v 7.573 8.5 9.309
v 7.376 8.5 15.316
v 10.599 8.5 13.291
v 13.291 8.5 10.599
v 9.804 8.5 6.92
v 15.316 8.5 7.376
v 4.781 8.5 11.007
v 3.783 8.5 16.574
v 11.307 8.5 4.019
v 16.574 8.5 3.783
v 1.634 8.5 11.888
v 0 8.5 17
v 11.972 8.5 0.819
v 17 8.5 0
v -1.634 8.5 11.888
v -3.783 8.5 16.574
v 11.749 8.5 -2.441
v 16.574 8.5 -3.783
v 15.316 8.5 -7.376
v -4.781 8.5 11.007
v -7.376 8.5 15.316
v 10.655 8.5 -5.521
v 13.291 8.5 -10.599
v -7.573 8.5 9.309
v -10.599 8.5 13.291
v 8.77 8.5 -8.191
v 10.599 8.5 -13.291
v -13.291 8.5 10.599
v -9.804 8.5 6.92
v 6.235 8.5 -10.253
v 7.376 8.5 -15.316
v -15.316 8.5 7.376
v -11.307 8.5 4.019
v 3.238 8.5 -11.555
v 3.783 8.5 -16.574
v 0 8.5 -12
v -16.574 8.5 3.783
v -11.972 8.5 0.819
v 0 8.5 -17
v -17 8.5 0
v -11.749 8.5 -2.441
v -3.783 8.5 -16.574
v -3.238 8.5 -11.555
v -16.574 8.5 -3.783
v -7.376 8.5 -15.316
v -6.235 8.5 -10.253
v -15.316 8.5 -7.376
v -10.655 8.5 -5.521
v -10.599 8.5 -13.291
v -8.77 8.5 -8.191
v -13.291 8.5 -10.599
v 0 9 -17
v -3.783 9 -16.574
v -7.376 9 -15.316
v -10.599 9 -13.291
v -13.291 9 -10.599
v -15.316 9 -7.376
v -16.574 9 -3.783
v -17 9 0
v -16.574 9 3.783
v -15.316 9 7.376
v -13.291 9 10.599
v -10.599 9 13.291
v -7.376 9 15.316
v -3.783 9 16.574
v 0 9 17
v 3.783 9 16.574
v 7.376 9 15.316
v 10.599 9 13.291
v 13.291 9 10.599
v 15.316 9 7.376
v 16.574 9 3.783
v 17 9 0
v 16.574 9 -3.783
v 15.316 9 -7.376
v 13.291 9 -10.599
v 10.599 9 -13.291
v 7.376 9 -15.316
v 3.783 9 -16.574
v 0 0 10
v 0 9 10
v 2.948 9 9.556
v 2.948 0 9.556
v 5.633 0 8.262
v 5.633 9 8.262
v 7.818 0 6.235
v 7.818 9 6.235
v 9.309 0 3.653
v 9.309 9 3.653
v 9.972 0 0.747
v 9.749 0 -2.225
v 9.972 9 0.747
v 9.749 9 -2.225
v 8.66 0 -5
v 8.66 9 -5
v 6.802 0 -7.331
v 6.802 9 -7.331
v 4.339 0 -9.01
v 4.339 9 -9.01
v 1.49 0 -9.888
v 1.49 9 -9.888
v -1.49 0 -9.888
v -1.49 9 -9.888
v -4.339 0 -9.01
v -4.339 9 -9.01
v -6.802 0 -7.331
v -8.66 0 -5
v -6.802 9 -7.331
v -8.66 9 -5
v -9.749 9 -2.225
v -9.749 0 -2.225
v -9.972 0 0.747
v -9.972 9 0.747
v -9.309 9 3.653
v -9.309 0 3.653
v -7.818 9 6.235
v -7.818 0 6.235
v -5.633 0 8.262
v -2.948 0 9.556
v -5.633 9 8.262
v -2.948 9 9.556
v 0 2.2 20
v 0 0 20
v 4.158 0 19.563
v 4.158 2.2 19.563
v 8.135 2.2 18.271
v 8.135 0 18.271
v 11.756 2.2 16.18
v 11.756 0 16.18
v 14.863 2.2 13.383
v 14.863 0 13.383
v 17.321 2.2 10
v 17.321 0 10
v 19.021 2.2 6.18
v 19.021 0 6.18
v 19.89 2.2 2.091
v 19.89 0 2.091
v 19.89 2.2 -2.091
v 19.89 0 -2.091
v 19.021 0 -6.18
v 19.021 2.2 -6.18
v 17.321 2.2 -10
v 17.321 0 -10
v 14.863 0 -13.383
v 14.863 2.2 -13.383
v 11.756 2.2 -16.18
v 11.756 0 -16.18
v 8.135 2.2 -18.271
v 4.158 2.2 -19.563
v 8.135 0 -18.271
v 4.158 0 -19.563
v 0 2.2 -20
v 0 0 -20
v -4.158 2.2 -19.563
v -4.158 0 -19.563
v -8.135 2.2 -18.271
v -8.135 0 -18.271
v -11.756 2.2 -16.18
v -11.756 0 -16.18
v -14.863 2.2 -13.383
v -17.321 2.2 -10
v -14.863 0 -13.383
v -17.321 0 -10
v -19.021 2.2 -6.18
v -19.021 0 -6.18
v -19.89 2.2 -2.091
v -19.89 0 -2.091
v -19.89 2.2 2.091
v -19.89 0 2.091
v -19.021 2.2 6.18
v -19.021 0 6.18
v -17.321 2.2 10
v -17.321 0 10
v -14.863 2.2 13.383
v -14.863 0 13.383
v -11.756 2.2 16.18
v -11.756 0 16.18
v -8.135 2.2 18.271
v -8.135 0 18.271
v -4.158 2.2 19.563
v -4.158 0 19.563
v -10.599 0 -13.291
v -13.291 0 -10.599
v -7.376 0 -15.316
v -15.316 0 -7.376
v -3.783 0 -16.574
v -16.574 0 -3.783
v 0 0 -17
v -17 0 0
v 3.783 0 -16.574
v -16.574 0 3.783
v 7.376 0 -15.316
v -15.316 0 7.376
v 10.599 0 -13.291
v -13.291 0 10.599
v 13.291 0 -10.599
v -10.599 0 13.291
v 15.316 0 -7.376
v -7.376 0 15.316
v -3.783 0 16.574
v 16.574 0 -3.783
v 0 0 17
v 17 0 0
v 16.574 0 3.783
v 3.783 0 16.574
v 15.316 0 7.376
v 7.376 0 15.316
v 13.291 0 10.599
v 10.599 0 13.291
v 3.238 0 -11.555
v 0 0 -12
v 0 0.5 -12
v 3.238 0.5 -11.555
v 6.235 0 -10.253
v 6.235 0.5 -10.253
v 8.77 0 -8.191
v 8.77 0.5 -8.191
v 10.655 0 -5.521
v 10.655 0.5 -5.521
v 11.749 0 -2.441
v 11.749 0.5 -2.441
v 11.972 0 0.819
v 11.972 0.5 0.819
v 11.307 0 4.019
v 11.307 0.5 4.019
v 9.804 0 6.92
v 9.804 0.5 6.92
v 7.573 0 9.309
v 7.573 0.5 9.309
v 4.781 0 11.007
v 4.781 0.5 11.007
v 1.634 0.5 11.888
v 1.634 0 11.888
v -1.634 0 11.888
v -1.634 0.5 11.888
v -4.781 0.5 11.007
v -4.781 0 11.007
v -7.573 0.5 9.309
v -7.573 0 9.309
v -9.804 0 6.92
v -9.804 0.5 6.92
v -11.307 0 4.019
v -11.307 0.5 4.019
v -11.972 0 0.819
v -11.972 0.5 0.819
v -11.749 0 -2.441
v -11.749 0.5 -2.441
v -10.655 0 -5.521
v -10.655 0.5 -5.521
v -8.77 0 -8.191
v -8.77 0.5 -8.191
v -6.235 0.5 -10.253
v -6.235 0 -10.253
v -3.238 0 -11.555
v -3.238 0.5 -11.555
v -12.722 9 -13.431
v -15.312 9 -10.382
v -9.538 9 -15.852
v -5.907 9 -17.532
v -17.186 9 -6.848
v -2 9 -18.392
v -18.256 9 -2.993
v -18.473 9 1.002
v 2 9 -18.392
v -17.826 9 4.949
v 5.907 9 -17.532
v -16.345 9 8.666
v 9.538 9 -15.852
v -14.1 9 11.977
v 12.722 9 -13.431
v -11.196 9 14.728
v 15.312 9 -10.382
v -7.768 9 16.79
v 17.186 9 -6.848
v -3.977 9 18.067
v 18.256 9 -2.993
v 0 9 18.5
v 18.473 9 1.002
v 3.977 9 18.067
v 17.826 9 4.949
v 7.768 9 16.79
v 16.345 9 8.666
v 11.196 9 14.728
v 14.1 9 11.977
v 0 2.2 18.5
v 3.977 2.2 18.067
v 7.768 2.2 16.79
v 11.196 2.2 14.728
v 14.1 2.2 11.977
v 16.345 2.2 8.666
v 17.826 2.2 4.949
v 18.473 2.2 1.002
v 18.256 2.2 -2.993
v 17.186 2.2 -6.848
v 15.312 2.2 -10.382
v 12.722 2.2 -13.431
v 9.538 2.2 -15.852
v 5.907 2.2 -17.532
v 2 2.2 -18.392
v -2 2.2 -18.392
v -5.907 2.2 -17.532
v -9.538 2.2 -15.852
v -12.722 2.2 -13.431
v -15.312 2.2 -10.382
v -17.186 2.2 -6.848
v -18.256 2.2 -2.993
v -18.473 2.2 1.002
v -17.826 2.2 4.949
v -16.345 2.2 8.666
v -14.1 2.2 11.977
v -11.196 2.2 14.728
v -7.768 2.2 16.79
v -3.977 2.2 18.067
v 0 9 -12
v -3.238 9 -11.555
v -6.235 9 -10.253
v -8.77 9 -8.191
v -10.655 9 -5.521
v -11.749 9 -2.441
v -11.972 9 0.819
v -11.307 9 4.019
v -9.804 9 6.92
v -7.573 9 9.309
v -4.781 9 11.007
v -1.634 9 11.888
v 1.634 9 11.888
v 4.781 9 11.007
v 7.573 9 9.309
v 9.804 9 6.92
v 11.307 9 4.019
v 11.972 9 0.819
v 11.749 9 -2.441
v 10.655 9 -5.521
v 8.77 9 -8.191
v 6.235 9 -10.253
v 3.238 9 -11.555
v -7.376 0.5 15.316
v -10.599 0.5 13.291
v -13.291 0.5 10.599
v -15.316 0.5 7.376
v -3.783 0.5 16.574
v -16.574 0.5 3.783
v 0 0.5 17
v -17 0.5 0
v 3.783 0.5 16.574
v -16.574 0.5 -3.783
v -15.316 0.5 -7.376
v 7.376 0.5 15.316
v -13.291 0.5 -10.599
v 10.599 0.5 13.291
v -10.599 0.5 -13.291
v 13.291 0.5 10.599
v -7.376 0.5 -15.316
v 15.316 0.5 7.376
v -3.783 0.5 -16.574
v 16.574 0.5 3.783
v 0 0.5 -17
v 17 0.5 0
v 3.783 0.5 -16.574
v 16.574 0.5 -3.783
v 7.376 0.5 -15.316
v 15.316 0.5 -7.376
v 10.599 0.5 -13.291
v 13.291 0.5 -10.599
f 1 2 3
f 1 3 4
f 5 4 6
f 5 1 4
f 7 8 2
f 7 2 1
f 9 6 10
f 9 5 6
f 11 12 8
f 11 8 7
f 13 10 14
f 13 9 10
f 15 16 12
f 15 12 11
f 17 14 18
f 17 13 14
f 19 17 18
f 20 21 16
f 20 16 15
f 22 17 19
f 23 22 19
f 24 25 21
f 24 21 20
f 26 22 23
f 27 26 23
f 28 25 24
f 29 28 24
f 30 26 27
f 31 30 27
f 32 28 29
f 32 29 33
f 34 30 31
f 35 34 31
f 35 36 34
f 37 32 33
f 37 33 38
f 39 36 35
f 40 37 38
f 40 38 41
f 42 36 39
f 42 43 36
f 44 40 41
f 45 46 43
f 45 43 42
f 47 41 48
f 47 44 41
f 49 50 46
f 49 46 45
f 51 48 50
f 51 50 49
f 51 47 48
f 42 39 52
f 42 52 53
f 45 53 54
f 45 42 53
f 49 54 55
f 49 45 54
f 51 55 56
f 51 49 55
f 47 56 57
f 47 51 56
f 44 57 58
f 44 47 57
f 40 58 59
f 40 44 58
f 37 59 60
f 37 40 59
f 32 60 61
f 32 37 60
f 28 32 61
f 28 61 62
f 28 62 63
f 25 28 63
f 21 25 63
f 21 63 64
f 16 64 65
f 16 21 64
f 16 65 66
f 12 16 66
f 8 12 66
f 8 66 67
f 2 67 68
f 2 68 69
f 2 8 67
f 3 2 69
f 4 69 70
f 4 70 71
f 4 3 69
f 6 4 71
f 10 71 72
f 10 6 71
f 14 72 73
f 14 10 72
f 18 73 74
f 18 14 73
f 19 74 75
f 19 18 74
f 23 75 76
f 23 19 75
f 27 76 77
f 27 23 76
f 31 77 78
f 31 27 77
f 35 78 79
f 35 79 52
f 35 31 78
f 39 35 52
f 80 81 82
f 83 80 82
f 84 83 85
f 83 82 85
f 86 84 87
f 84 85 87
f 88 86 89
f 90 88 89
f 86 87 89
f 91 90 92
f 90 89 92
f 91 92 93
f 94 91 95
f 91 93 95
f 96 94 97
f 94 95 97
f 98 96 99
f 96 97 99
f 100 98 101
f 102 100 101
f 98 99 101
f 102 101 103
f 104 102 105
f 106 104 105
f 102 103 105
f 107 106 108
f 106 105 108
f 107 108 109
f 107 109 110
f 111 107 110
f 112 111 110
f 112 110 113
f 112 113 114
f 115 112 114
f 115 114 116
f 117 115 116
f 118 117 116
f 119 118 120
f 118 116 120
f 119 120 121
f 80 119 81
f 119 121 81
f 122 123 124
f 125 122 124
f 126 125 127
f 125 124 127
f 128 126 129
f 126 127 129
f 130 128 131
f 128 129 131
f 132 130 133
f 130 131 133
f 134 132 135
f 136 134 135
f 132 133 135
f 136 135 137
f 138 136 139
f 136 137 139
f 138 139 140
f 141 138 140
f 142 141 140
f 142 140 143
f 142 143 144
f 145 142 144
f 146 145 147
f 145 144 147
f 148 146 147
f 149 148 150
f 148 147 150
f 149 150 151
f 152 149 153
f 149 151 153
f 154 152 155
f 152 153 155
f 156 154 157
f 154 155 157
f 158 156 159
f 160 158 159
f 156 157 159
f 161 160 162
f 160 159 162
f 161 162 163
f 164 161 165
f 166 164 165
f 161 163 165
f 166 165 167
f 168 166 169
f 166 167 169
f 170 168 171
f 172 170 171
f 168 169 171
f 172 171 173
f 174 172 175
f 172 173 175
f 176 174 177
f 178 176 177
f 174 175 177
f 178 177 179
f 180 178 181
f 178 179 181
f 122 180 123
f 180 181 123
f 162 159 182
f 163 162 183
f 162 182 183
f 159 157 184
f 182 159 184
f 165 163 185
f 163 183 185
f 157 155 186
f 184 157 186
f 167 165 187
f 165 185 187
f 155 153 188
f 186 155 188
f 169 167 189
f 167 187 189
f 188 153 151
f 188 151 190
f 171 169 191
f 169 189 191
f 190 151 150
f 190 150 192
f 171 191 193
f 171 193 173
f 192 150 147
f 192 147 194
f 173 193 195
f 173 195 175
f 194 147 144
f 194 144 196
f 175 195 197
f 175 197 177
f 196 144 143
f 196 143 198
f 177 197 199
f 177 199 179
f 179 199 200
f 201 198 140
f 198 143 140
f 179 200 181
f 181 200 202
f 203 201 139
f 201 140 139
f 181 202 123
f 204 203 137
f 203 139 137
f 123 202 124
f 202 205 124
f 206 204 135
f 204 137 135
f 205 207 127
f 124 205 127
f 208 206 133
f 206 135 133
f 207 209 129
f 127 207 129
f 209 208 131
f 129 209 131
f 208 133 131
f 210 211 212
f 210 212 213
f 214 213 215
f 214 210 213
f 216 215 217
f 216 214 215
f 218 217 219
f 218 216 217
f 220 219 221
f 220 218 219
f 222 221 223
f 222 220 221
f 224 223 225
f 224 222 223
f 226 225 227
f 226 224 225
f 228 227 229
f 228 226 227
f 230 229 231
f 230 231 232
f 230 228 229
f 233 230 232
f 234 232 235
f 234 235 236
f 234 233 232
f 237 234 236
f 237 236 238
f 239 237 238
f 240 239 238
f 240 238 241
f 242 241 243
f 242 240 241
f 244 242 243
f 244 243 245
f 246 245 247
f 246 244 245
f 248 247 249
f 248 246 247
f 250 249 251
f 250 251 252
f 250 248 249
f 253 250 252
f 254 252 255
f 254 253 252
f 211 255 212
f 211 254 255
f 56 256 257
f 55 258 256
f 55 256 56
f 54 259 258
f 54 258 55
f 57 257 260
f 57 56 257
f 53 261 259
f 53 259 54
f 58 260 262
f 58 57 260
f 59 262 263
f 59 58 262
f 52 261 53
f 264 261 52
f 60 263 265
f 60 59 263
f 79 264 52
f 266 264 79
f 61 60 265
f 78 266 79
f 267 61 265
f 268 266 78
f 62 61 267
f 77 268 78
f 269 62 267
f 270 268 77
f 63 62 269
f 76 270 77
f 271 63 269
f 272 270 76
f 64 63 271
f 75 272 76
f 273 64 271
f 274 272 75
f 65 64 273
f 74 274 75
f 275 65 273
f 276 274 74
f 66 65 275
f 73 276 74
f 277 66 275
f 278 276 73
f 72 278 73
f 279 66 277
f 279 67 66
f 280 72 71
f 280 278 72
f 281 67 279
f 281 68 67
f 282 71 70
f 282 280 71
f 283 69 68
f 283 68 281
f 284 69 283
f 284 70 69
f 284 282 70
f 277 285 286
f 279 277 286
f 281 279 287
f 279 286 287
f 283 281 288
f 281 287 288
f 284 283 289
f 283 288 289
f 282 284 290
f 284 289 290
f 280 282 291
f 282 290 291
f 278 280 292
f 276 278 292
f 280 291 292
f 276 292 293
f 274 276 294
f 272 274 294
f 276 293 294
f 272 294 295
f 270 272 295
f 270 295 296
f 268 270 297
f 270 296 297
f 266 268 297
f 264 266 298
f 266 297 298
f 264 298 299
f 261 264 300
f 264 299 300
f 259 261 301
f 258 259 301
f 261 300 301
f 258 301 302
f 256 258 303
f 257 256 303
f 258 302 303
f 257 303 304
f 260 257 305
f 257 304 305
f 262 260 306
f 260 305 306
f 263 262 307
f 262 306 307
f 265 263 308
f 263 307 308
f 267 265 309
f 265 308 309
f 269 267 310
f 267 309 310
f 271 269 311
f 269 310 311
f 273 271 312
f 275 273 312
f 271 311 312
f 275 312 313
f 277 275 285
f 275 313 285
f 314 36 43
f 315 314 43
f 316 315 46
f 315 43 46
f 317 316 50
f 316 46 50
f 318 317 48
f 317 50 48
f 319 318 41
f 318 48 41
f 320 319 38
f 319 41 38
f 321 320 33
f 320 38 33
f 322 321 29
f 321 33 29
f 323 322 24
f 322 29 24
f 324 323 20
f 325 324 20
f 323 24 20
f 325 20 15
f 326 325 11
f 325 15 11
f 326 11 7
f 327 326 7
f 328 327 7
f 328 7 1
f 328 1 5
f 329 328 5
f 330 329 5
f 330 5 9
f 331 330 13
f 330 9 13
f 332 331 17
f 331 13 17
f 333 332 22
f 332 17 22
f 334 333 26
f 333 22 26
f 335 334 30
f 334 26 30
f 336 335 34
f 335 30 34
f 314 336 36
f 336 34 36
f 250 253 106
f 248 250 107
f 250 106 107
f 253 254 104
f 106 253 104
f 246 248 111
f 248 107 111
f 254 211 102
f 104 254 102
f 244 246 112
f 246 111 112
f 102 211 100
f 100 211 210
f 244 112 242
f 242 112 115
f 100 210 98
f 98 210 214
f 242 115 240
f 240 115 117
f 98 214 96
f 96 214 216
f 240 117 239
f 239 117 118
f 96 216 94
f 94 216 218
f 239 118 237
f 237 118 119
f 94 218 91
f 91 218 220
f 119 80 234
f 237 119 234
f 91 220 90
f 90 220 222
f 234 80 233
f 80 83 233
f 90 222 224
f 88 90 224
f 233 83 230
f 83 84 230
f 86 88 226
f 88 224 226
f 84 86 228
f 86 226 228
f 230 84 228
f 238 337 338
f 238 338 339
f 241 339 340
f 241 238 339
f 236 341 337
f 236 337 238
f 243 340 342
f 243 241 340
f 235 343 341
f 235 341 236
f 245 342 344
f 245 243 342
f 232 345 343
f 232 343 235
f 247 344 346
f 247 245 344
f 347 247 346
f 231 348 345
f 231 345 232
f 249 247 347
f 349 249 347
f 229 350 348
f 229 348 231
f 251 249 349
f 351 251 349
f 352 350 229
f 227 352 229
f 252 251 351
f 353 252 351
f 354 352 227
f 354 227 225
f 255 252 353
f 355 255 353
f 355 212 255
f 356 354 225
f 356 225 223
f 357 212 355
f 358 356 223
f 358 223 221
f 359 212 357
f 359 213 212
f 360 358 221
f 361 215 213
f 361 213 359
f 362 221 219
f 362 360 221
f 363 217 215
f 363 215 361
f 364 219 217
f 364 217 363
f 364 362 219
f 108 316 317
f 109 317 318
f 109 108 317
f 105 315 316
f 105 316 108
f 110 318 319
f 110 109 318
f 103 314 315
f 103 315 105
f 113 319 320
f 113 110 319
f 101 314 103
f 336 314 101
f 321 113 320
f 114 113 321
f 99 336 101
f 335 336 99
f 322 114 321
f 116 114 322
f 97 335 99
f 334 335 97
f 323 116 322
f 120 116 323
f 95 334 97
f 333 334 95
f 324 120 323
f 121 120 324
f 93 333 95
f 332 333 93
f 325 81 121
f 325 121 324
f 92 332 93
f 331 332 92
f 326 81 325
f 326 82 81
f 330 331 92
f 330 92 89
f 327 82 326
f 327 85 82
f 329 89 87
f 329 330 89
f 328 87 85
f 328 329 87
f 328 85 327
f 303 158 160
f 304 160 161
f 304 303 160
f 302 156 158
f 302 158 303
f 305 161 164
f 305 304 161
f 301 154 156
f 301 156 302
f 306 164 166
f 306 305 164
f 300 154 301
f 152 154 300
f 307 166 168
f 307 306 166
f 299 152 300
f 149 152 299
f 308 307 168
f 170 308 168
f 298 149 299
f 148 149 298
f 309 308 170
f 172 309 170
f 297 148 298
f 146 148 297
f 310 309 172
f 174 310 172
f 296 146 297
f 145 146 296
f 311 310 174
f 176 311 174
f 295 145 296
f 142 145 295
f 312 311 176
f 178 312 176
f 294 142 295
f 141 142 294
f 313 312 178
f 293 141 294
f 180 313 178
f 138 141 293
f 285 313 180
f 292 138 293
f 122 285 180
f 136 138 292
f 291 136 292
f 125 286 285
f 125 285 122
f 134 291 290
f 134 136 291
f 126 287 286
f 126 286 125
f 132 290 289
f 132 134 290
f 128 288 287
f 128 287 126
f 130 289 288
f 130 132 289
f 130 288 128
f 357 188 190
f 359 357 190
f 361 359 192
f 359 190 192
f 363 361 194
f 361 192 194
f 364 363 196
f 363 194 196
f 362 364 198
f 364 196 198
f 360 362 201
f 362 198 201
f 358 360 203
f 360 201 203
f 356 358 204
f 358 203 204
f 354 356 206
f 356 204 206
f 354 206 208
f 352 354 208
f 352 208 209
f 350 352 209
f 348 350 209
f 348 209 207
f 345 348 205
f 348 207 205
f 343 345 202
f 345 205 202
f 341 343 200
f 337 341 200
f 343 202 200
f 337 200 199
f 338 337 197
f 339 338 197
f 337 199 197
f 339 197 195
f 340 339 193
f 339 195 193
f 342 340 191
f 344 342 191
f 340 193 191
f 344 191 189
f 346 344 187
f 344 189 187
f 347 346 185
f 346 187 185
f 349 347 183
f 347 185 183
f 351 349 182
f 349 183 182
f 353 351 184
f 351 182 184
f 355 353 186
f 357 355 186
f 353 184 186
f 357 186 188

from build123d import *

# Parameters (mm, degrees)
SKETCH_1_R          = 20
EXTRUDE_1_DEPTH     = 2.2
SKETCH_2_R          = 18.5
EXTRUDE_2_DEPTH     = 6.8
SKETCH_3_R          = 10
CUT_EXTRUDE_1_DEPTH = 9
SKETCH_4_R          = 17
SKETCH_4_R_2        = 12
CUT_EXTRUDE_2_DEPTH = 0.5
CUT_EXTRUDE_START   = -0.5
SKETCH_5_R          = 17
SKETCH_5_R_2        = 12
CUT_EXTRUDE_3_DEPTH = 0.5


with BuildPart() as part:
    # 草图1 → 凸台-拉伸1 (new body)
    with BuildSketch(Plane(origin=(0, 0, 0), x_dir=(1, 0, 0), z_dir=(0, 1, 0))):
        with Locations(Location((0, 0, 0), (0, 0, 270))):
            Circle(SKETCH_1_R)
    extrude(amount=EXTRUDE_1_DEPTH)

    # 草图2 → 凸台-拉伸2 (add)
    with BuildSketch(Plane(origin=(0, 2.2, 0), x_dir=(1, 0, 0), z_dir=(0, 1, 0))):
        with Locations(Location((0, 0, 0), (0, 0, 270))):
            Circle(SKETCH_2_R)
    extrude(amount=EXTRUDE_2_DEPTH)

    # 草图3 → 切除-拉伸1 (cut)
    with BuildSketch(Plane(origin=(0, 9, 0), x_dir=(1, 0, 0), z_dir=(0, 1, 0))):
        with Locations(Location((0, 0, 0), (0, 0, 270))):
            Circle(SKETCH_3_R)
    extrude(amount=-CUT_EXTRUDE_1_DEPTH, mode=Mode.SUBTRACT)

    # 草图4 → 切除-拉伸2 (cut)
    with BuildSketch(Plane.XZ):
        with Locations(Location((0, 0, 0), (0, 0, 270))):
            Circle(SKETCH_4_R)
        with Locations(Location((0, 0, 0), (0, 0, 270))):
            Circle(SKETCH_4_R_2, mode=Mode.SUBTRACT)
    extrude(amount=-CUT_EXTRUDE_2_DEPTH, mode=Mode.SUBTRACT)

    # 草图5 → 切除-拉伸3 (cut)
    with BuildSketch(Plane(origin=(0, 9, 0), x_dir=(1, 0, 0), z_dir=(0, 1, 0)).offset(CUT_EXTRUDE_START)):
        with Locations(Location((0, 0, 0), (0, 0, 90))):
            Circle(SKETCH_5_R)
        with Locations(Location((0, 0, 0), (0, 0, 90))):
            Circle(SKETCH_5_R_2, mode=Mode.SUBTRACT)
    extrude(amount=CUT_EXTRUDE_3_DEPTH, mode=Mode.SUBTRACT)


solid = part.part
